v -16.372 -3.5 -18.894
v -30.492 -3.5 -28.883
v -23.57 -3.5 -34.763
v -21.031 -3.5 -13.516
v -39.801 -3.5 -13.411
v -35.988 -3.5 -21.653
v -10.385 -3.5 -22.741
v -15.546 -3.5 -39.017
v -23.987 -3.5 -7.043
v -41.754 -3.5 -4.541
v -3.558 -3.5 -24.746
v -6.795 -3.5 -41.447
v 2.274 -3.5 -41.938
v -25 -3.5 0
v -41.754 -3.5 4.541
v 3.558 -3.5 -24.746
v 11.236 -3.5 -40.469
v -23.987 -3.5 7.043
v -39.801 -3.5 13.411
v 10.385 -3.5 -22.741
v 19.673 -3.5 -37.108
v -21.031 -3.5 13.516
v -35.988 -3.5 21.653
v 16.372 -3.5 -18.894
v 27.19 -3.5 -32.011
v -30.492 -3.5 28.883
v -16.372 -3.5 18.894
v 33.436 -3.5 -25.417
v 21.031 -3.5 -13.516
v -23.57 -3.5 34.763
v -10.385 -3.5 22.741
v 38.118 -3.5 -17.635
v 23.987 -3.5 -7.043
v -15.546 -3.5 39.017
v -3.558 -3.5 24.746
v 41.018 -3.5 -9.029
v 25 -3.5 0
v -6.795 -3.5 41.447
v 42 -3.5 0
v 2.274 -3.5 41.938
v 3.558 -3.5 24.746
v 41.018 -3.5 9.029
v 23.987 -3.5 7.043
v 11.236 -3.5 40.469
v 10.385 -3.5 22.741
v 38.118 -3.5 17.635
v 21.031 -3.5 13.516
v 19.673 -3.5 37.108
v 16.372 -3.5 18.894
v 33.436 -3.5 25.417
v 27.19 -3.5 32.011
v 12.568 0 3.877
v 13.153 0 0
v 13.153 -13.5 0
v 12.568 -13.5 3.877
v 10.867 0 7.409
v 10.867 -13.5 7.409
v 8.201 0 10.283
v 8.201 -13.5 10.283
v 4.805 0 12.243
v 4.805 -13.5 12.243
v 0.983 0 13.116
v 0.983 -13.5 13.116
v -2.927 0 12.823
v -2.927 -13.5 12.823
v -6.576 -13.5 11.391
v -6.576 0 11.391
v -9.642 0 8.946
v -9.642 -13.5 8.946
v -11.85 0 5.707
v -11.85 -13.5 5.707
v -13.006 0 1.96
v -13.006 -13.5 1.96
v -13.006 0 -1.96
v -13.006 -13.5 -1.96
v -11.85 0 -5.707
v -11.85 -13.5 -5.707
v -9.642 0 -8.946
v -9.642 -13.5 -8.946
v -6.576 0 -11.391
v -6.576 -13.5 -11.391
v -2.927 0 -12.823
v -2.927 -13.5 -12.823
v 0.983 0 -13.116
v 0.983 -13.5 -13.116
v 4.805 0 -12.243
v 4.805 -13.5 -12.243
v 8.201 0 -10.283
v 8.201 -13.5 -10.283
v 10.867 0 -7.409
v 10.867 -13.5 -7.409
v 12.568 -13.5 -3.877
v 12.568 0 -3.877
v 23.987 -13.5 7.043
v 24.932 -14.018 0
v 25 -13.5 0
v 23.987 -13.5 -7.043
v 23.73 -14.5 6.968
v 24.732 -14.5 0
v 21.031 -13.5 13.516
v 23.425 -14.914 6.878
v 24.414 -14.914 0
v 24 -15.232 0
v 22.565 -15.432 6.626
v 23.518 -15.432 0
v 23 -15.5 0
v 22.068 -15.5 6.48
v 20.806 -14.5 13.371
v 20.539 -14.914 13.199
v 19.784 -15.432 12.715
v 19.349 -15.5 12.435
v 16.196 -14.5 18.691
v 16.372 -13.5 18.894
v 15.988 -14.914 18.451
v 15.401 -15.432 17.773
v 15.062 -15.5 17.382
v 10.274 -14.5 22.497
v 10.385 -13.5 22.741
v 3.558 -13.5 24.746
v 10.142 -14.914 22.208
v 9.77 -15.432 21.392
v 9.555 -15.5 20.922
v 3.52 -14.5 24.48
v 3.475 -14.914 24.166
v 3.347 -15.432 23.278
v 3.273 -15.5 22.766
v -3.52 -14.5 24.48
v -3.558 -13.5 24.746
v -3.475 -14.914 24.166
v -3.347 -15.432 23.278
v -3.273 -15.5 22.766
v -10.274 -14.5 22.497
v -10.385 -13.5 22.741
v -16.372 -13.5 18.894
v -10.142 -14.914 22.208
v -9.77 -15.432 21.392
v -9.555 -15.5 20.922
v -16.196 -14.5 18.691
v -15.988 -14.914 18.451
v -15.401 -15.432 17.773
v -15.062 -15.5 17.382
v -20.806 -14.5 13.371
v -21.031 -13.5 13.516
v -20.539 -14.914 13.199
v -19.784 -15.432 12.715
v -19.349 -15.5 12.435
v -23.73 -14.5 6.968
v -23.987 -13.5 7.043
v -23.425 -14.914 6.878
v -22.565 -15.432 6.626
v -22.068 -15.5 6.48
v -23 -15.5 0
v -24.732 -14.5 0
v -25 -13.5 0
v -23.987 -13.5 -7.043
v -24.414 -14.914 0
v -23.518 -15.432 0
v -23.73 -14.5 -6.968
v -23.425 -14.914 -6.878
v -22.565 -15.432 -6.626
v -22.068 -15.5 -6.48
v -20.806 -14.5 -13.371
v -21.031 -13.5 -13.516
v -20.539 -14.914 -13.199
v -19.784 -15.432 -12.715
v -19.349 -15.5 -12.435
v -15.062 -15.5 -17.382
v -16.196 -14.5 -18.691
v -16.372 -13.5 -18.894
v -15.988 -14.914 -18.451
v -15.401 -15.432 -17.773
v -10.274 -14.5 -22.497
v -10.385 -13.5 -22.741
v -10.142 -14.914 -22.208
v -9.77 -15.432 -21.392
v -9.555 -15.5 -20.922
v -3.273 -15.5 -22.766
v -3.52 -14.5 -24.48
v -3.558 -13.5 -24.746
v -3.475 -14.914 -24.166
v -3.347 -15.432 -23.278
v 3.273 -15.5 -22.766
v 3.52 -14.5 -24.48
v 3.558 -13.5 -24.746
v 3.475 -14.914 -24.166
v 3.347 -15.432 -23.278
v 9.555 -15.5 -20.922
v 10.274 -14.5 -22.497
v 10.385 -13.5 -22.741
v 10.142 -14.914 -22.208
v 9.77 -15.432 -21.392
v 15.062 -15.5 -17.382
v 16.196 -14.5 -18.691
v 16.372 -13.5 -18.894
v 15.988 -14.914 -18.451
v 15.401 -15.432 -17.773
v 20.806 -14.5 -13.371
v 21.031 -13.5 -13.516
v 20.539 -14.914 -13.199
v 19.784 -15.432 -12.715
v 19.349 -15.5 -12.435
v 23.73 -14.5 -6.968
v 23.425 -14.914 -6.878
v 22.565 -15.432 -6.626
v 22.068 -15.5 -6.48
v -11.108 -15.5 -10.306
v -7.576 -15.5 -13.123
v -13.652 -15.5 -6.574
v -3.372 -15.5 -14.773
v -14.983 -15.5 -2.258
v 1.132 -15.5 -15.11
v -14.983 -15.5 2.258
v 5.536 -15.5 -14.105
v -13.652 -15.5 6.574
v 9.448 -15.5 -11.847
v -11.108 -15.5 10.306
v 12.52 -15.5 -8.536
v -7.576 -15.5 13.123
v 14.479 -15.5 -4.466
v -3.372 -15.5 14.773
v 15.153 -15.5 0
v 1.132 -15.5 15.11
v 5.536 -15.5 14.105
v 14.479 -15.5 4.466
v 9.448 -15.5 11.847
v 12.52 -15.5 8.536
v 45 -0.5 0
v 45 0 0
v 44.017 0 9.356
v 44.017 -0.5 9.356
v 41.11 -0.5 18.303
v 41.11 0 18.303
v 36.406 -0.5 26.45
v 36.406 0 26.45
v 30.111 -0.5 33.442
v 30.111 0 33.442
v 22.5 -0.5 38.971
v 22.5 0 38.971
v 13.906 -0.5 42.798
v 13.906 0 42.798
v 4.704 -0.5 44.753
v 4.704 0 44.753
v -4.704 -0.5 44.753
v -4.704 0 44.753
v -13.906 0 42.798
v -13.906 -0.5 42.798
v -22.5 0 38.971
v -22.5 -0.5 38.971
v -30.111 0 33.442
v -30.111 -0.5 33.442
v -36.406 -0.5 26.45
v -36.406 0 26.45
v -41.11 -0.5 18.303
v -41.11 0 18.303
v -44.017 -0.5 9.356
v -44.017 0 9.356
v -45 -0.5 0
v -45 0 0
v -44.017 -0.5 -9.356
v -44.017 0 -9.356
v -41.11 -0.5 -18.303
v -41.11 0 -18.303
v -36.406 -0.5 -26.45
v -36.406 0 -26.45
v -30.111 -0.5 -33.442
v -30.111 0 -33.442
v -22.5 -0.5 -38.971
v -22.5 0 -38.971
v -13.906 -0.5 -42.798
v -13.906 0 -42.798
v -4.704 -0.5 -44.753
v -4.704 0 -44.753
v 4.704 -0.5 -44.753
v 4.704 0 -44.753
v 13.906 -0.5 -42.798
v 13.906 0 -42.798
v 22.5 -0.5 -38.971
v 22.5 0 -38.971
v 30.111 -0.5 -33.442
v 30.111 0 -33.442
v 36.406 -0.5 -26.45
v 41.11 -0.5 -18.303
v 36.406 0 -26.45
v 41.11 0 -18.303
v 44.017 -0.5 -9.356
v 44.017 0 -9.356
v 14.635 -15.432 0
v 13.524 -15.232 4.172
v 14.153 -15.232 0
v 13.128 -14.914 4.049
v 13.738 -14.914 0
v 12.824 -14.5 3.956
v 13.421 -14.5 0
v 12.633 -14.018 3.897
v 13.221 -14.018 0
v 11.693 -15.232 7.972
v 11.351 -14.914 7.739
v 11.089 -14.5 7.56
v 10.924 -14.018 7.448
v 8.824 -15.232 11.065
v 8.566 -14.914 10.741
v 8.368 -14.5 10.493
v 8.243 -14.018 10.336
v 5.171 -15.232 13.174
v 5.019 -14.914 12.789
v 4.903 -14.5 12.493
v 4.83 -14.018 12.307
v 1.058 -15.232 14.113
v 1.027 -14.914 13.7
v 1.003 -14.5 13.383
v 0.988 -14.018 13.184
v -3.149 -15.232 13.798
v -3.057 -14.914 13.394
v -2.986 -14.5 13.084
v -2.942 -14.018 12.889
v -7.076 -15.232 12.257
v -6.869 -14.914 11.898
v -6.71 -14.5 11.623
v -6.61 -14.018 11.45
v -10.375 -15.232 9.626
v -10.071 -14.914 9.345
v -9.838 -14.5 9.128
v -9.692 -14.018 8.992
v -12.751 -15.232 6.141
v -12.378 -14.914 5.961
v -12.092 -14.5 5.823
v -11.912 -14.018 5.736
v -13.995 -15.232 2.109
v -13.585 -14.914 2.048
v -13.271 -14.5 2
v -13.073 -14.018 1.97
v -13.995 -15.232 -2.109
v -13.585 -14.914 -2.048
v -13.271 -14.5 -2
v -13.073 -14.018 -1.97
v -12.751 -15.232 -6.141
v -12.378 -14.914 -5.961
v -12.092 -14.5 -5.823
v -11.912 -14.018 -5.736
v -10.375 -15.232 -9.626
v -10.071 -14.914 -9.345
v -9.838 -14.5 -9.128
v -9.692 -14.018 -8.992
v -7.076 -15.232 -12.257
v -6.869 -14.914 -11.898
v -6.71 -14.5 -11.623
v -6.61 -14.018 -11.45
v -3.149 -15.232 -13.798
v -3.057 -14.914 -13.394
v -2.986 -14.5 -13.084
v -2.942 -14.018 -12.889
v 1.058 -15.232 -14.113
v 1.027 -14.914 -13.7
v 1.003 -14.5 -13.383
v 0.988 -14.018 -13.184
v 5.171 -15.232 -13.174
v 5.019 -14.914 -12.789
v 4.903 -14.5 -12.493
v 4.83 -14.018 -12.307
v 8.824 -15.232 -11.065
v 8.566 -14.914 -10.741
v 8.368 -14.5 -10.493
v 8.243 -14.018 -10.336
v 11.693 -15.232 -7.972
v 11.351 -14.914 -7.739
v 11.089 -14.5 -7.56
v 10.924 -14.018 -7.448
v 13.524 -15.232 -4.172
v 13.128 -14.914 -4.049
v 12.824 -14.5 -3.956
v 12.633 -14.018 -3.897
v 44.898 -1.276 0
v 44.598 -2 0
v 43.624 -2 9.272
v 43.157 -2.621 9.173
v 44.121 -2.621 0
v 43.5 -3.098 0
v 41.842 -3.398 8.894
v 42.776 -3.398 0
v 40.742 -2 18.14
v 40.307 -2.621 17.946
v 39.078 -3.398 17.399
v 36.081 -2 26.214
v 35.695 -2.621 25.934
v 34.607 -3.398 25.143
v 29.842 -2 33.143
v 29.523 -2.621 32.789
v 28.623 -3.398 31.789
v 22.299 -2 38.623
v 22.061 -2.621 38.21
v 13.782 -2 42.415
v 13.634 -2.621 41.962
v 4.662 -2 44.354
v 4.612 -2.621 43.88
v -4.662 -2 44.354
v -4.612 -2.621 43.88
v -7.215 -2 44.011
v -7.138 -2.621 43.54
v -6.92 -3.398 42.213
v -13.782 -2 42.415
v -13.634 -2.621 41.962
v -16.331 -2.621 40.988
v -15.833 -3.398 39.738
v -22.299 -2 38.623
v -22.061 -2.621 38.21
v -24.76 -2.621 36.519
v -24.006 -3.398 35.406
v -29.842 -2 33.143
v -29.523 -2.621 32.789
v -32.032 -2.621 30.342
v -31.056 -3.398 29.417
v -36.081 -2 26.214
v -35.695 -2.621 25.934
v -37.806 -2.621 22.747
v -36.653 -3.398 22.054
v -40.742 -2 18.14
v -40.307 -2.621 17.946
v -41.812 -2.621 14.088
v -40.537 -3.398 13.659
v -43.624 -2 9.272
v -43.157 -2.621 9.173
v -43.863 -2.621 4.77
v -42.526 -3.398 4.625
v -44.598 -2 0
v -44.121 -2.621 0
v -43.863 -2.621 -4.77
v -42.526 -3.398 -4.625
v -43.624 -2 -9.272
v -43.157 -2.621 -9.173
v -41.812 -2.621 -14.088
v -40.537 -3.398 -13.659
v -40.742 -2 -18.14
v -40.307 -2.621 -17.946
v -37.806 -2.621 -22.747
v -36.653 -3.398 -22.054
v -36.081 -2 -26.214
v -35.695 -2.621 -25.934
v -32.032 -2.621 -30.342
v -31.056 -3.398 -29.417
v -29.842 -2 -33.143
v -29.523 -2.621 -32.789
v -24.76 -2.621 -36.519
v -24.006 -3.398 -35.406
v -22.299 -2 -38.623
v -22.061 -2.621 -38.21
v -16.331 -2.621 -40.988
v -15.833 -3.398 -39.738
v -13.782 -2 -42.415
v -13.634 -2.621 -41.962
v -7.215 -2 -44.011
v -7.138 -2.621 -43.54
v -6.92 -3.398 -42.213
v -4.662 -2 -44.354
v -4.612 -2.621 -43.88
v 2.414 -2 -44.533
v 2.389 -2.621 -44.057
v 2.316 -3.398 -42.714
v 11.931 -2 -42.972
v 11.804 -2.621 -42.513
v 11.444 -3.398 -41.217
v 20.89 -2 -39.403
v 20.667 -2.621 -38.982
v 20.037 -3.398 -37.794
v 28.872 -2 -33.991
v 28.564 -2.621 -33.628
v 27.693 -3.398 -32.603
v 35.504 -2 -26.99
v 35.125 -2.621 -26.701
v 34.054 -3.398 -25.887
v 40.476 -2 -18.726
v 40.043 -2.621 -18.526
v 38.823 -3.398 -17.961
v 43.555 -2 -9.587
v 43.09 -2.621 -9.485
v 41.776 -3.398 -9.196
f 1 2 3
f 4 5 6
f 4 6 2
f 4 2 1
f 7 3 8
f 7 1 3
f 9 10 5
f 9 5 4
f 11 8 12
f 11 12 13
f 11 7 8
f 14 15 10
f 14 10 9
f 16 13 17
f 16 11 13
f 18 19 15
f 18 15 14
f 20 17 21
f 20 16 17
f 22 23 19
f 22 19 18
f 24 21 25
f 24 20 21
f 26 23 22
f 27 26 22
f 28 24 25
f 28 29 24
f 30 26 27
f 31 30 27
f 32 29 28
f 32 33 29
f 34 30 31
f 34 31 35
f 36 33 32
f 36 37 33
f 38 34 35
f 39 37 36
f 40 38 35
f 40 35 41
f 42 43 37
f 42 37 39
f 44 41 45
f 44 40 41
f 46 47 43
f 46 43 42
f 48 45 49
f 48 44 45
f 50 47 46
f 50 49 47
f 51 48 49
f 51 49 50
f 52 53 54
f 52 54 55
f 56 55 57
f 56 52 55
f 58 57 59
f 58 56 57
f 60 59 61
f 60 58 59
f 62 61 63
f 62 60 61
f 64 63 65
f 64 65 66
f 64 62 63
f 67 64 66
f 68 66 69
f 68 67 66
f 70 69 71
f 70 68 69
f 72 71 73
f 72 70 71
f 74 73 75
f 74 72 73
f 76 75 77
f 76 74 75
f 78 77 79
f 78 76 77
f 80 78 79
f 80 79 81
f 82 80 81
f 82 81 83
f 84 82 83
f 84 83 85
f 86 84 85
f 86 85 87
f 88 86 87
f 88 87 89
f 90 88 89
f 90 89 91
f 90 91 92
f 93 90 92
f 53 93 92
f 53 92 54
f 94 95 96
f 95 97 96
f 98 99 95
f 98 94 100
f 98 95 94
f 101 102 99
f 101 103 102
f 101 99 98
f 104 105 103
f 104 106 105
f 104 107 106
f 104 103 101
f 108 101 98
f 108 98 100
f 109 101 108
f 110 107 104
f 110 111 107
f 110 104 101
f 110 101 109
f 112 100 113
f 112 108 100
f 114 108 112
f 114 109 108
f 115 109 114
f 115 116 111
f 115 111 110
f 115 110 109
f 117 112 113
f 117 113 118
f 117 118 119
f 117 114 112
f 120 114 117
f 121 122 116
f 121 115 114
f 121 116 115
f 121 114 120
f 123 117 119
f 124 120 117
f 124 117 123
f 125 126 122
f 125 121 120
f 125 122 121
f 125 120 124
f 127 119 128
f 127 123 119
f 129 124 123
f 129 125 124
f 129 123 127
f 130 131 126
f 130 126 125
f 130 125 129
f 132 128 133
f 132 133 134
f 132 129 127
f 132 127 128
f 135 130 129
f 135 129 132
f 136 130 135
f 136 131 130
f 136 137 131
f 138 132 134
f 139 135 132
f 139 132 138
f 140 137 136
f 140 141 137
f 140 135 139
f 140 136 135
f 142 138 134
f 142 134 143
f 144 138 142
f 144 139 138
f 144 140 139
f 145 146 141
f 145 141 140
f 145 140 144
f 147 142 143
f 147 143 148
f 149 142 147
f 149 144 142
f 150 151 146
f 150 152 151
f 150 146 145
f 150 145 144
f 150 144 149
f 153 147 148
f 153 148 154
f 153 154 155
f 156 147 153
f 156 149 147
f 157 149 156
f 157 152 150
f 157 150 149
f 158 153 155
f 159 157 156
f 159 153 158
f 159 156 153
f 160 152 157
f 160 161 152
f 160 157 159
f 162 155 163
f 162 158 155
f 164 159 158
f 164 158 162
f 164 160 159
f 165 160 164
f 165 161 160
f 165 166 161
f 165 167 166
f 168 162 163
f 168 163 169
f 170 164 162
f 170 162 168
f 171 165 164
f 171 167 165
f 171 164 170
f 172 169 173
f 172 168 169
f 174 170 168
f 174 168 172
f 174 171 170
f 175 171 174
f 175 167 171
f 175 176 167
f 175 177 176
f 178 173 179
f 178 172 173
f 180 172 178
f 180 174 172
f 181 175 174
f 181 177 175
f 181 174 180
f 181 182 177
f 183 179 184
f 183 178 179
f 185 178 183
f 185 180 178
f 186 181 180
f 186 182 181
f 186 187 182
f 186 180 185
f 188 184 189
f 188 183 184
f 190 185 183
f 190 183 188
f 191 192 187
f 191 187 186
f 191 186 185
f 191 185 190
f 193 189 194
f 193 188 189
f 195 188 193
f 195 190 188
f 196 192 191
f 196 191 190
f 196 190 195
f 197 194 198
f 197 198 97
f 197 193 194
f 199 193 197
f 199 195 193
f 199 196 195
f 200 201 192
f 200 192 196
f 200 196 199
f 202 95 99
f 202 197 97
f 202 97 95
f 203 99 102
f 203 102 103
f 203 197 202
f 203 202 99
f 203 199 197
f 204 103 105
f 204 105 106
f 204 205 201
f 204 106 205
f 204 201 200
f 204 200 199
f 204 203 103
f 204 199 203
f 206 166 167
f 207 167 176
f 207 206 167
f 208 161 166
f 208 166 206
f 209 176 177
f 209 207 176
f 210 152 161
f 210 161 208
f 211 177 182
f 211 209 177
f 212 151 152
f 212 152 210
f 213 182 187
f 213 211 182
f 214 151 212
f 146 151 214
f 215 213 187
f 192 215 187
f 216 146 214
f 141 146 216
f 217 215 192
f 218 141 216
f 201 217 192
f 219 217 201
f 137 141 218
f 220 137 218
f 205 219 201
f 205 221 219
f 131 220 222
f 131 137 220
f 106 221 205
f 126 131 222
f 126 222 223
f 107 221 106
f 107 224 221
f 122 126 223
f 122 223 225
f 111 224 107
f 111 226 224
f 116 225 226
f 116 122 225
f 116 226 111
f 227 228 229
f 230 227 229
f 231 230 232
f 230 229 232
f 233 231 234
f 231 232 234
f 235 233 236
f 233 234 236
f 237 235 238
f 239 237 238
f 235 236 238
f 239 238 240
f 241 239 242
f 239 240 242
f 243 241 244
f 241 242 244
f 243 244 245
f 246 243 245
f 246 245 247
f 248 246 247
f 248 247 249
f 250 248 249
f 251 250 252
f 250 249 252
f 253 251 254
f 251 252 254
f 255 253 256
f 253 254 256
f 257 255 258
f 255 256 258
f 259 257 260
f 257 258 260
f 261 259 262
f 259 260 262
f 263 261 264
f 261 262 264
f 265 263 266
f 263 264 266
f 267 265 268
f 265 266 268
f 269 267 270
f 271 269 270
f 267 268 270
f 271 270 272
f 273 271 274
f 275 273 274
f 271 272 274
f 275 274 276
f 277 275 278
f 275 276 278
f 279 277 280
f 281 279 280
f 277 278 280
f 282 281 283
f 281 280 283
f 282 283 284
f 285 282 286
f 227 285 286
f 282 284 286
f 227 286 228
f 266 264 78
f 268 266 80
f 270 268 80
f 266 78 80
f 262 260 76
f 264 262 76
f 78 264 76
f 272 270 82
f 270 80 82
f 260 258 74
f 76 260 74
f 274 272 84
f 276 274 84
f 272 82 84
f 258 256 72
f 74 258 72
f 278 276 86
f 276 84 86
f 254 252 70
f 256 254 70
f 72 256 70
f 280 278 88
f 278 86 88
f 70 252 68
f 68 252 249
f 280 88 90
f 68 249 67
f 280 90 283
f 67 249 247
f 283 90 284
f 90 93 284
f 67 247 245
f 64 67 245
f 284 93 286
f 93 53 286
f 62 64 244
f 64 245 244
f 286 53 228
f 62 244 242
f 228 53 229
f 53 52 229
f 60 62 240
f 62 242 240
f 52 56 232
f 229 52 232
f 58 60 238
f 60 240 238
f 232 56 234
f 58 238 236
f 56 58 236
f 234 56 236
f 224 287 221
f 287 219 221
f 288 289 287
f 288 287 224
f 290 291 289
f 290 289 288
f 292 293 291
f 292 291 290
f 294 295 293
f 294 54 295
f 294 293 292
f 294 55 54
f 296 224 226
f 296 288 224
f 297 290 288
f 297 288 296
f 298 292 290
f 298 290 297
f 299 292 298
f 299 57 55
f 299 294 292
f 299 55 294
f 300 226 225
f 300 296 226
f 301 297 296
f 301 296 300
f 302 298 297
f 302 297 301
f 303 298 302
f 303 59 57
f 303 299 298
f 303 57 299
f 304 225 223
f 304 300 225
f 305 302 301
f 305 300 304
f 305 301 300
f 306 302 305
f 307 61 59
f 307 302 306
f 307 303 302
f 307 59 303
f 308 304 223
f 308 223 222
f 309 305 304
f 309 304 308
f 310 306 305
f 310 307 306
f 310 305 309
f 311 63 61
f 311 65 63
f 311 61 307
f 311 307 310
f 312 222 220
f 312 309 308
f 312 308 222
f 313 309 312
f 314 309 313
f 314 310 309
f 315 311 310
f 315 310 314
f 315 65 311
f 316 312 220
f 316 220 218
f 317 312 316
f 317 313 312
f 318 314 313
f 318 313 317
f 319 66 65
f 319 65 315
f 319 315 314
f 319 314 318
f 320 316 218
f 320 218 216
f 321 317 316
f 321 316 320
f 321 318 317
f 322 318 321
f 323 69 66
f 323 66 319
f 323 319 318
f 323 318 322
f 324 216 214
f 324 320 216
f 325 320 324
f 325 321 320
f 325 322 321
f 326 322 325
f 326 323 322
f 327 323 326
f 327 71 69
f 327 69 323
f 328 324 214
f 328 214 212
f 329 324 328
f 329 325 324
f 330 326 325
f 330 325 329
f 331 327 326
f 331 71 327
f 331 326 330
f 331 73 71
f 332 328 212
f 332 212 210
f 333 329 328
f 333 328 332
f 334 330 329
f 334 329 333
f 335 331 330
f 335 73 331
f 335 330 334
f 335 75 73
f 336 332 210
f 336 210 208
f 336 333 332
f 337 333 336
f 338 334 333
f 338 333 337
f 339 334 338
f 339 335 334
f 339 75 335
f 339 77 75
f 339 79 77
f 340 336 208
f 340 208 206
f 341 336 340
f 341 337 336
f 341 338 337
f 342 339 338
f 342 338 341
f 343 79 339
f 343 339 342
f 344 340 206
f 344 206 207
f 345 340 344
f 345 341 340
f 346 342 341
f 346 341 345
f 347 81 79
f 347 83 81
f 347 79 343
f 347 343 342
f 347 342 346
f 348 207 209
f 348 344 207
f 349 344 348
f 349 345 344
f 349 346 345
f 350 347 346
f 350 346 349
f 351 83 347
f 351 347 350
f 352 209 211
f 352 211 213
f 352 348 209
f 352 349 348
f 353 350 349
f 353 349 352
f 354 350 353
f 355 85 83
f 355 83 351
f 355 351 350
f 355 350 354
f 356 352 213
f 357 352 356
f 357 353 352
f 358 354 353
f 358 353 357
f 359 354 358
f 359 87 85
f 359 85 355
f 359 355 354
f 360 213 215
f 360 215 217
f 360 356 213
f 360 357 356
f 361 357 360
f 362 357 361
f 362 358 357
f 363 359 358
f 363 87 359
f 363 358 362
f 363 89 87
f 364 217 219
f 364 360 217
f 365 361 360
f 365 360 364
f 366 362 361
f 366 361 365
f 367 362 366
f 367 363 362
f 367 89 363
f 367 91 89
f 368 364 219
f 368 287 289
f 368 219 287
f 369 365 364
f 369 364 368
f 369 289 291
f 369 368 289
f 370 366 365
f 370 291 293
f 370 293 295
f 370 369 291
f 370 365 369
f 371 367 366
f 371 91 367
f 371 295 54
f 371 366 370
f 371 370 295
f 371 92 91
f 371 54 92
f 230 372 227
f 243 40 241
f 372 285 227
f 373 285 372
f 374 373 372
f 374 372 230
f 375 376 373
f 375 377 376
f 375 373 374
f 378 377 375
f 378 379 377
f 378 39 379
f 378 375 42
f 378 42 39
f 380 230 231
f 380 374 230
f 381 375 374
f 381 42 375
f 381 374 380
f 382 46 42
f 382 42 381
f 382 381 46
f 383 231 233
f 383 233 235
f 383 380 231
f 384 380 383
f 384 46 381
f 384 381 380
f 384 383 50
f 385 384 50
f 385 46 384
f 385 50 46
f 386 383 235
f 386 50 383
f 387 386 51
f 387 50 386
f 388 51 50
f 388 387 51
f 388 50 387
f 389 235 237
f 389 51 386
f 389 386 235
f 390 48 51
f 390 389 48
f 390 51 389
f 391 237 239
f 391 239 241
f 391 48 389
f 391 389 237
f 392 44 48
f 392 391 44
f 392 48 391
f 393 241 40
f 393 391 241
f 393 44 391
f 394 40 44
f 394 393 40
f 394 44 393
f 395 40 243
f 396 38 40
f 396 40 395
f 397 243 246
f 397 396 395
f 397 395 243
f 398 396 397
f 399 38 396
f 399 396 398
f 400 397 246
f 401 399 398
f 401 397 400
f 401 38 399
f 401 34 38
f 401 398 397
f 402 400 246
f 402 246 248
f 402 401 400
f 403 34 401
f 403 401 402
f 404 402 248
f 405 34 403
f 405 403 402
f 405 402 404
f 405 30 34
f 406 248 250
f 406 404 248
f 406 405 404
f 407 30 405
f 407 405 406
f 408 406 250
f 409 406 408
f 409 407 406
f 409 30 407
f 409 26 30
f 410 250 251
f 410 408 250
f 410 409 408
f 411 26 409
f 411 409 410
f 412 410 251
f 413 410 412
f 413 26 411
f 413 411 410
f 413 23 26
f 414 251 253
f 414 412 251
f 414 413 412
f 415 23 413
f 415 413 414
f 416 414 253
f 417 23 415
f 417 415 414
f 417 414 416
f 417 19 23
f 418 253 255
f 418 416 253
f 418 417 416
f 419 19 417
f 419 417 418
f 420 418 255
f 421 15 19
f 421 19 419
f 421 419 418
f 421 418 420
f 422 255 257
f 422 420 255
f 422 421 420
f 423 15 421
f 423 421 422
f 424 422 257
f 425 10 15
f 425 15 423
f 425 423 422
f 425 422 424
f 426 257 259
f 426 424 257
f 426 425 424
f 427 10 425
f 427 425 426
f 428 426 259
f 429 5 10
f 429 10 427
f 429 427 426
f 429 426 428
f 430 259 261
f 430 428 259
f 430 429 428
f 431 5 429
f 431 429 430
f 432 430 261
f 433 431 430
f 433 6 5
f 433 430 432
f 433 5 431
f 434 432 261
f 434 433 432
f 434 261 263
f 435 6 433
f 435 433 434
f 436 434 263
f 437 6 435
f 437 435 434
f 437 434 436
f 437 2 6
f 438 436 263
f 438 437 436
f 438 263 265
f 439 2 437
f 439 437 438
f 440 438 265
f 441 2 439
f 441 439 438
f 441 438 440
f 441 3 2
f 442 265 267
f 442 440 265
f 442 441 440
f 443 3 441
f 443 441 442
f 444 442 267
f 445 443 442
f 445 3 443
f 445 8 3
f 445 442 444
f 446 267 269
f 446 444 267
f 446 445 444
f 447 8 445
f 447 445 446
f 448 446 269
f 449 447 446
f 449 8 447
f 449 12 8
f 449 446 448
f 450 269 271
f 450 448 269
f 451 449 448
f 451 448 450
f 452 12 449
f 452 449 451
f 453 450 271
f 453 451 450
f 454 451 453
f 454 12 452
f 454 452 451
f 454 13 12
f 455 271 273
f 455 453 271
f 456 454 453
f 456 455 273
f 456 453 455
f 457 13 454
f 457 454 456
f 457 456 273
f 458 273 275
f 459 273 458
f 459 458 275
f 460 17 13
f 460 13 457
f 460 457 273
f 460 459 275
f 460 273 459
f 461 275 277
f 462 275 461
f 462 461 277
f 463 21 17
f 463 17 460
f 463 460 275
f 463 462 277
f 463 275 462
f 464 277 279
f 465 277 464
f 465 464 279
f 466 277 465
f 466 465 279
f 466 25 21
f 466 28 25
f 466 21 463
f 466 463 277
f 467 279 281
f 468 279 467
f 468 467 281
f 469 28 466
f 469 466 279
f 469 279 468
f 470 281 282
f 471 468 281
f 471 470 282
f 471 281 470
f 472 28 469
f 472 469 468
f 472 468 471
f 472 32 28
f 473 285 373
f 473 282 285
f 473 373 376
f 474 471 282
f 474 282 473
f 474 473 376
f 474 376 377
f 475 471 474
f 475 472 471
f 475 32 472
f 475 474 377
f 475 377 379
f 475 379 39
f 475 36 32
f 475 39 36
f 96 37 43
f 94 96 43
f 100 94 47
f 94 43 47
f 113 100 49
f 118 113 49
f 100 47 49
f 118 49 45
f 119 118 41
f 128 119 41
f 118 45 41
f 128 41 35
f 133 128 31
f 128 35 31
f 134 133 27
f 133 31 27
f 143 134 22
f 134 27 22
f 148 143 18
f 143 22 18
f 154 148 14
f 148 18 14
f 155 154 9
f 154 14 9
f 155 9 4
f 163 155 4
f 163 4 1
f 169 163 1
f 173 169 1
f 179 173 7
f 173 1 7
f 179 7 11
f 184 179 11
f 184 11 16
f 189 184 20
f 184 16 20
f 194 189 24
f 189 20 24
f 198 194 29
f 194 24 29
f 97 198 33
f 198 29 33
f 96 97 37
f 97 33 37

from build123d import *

# Parameters (mm, degrees)
F0_R     = 45
F0_R_2   = 13.1526649771
F1_DEPTH = 3.5
F2_R     = 3
F3_R     = 25
F3_R_2   = 13.1526649771
F4_DEPTH = 12
F5_R     = 2


with BuildPart() as f1:
    # F0 (on Front) → F1 (new body)
    with BuildSketch(Plane.XZ):
        Circle(F0_R)
        Circle(F0_R_2, mode=Mode.SUBTRACT)
    extrude(amount=F1_DEPTH)

    # F2
    f2_edges = [f1.edges().sort_by_distance(p)[0] for p in [
        (-45, -3.5, 0),
    ]]
    fillet(f2_edges, radius=F2_R)

    # F3 (on face) → F4 (join)
    with BuildSketch(Plane.XZ.offset(3.5)):
        Circle(F3_R)
        Circle(F3_R_2, mode=Mode.SUBTRACT)
    extrude(amount=F4_DEPTH)

    # F5
    f5_edges = [f1.edges().sort_by_distance(p)[0] for p in [
        (-13.152665, -15.5, 0),
        (-25, -15.5, 0),
    ]]
    fillet(f5_edges, radius=F5_R)


solid = f1.part
